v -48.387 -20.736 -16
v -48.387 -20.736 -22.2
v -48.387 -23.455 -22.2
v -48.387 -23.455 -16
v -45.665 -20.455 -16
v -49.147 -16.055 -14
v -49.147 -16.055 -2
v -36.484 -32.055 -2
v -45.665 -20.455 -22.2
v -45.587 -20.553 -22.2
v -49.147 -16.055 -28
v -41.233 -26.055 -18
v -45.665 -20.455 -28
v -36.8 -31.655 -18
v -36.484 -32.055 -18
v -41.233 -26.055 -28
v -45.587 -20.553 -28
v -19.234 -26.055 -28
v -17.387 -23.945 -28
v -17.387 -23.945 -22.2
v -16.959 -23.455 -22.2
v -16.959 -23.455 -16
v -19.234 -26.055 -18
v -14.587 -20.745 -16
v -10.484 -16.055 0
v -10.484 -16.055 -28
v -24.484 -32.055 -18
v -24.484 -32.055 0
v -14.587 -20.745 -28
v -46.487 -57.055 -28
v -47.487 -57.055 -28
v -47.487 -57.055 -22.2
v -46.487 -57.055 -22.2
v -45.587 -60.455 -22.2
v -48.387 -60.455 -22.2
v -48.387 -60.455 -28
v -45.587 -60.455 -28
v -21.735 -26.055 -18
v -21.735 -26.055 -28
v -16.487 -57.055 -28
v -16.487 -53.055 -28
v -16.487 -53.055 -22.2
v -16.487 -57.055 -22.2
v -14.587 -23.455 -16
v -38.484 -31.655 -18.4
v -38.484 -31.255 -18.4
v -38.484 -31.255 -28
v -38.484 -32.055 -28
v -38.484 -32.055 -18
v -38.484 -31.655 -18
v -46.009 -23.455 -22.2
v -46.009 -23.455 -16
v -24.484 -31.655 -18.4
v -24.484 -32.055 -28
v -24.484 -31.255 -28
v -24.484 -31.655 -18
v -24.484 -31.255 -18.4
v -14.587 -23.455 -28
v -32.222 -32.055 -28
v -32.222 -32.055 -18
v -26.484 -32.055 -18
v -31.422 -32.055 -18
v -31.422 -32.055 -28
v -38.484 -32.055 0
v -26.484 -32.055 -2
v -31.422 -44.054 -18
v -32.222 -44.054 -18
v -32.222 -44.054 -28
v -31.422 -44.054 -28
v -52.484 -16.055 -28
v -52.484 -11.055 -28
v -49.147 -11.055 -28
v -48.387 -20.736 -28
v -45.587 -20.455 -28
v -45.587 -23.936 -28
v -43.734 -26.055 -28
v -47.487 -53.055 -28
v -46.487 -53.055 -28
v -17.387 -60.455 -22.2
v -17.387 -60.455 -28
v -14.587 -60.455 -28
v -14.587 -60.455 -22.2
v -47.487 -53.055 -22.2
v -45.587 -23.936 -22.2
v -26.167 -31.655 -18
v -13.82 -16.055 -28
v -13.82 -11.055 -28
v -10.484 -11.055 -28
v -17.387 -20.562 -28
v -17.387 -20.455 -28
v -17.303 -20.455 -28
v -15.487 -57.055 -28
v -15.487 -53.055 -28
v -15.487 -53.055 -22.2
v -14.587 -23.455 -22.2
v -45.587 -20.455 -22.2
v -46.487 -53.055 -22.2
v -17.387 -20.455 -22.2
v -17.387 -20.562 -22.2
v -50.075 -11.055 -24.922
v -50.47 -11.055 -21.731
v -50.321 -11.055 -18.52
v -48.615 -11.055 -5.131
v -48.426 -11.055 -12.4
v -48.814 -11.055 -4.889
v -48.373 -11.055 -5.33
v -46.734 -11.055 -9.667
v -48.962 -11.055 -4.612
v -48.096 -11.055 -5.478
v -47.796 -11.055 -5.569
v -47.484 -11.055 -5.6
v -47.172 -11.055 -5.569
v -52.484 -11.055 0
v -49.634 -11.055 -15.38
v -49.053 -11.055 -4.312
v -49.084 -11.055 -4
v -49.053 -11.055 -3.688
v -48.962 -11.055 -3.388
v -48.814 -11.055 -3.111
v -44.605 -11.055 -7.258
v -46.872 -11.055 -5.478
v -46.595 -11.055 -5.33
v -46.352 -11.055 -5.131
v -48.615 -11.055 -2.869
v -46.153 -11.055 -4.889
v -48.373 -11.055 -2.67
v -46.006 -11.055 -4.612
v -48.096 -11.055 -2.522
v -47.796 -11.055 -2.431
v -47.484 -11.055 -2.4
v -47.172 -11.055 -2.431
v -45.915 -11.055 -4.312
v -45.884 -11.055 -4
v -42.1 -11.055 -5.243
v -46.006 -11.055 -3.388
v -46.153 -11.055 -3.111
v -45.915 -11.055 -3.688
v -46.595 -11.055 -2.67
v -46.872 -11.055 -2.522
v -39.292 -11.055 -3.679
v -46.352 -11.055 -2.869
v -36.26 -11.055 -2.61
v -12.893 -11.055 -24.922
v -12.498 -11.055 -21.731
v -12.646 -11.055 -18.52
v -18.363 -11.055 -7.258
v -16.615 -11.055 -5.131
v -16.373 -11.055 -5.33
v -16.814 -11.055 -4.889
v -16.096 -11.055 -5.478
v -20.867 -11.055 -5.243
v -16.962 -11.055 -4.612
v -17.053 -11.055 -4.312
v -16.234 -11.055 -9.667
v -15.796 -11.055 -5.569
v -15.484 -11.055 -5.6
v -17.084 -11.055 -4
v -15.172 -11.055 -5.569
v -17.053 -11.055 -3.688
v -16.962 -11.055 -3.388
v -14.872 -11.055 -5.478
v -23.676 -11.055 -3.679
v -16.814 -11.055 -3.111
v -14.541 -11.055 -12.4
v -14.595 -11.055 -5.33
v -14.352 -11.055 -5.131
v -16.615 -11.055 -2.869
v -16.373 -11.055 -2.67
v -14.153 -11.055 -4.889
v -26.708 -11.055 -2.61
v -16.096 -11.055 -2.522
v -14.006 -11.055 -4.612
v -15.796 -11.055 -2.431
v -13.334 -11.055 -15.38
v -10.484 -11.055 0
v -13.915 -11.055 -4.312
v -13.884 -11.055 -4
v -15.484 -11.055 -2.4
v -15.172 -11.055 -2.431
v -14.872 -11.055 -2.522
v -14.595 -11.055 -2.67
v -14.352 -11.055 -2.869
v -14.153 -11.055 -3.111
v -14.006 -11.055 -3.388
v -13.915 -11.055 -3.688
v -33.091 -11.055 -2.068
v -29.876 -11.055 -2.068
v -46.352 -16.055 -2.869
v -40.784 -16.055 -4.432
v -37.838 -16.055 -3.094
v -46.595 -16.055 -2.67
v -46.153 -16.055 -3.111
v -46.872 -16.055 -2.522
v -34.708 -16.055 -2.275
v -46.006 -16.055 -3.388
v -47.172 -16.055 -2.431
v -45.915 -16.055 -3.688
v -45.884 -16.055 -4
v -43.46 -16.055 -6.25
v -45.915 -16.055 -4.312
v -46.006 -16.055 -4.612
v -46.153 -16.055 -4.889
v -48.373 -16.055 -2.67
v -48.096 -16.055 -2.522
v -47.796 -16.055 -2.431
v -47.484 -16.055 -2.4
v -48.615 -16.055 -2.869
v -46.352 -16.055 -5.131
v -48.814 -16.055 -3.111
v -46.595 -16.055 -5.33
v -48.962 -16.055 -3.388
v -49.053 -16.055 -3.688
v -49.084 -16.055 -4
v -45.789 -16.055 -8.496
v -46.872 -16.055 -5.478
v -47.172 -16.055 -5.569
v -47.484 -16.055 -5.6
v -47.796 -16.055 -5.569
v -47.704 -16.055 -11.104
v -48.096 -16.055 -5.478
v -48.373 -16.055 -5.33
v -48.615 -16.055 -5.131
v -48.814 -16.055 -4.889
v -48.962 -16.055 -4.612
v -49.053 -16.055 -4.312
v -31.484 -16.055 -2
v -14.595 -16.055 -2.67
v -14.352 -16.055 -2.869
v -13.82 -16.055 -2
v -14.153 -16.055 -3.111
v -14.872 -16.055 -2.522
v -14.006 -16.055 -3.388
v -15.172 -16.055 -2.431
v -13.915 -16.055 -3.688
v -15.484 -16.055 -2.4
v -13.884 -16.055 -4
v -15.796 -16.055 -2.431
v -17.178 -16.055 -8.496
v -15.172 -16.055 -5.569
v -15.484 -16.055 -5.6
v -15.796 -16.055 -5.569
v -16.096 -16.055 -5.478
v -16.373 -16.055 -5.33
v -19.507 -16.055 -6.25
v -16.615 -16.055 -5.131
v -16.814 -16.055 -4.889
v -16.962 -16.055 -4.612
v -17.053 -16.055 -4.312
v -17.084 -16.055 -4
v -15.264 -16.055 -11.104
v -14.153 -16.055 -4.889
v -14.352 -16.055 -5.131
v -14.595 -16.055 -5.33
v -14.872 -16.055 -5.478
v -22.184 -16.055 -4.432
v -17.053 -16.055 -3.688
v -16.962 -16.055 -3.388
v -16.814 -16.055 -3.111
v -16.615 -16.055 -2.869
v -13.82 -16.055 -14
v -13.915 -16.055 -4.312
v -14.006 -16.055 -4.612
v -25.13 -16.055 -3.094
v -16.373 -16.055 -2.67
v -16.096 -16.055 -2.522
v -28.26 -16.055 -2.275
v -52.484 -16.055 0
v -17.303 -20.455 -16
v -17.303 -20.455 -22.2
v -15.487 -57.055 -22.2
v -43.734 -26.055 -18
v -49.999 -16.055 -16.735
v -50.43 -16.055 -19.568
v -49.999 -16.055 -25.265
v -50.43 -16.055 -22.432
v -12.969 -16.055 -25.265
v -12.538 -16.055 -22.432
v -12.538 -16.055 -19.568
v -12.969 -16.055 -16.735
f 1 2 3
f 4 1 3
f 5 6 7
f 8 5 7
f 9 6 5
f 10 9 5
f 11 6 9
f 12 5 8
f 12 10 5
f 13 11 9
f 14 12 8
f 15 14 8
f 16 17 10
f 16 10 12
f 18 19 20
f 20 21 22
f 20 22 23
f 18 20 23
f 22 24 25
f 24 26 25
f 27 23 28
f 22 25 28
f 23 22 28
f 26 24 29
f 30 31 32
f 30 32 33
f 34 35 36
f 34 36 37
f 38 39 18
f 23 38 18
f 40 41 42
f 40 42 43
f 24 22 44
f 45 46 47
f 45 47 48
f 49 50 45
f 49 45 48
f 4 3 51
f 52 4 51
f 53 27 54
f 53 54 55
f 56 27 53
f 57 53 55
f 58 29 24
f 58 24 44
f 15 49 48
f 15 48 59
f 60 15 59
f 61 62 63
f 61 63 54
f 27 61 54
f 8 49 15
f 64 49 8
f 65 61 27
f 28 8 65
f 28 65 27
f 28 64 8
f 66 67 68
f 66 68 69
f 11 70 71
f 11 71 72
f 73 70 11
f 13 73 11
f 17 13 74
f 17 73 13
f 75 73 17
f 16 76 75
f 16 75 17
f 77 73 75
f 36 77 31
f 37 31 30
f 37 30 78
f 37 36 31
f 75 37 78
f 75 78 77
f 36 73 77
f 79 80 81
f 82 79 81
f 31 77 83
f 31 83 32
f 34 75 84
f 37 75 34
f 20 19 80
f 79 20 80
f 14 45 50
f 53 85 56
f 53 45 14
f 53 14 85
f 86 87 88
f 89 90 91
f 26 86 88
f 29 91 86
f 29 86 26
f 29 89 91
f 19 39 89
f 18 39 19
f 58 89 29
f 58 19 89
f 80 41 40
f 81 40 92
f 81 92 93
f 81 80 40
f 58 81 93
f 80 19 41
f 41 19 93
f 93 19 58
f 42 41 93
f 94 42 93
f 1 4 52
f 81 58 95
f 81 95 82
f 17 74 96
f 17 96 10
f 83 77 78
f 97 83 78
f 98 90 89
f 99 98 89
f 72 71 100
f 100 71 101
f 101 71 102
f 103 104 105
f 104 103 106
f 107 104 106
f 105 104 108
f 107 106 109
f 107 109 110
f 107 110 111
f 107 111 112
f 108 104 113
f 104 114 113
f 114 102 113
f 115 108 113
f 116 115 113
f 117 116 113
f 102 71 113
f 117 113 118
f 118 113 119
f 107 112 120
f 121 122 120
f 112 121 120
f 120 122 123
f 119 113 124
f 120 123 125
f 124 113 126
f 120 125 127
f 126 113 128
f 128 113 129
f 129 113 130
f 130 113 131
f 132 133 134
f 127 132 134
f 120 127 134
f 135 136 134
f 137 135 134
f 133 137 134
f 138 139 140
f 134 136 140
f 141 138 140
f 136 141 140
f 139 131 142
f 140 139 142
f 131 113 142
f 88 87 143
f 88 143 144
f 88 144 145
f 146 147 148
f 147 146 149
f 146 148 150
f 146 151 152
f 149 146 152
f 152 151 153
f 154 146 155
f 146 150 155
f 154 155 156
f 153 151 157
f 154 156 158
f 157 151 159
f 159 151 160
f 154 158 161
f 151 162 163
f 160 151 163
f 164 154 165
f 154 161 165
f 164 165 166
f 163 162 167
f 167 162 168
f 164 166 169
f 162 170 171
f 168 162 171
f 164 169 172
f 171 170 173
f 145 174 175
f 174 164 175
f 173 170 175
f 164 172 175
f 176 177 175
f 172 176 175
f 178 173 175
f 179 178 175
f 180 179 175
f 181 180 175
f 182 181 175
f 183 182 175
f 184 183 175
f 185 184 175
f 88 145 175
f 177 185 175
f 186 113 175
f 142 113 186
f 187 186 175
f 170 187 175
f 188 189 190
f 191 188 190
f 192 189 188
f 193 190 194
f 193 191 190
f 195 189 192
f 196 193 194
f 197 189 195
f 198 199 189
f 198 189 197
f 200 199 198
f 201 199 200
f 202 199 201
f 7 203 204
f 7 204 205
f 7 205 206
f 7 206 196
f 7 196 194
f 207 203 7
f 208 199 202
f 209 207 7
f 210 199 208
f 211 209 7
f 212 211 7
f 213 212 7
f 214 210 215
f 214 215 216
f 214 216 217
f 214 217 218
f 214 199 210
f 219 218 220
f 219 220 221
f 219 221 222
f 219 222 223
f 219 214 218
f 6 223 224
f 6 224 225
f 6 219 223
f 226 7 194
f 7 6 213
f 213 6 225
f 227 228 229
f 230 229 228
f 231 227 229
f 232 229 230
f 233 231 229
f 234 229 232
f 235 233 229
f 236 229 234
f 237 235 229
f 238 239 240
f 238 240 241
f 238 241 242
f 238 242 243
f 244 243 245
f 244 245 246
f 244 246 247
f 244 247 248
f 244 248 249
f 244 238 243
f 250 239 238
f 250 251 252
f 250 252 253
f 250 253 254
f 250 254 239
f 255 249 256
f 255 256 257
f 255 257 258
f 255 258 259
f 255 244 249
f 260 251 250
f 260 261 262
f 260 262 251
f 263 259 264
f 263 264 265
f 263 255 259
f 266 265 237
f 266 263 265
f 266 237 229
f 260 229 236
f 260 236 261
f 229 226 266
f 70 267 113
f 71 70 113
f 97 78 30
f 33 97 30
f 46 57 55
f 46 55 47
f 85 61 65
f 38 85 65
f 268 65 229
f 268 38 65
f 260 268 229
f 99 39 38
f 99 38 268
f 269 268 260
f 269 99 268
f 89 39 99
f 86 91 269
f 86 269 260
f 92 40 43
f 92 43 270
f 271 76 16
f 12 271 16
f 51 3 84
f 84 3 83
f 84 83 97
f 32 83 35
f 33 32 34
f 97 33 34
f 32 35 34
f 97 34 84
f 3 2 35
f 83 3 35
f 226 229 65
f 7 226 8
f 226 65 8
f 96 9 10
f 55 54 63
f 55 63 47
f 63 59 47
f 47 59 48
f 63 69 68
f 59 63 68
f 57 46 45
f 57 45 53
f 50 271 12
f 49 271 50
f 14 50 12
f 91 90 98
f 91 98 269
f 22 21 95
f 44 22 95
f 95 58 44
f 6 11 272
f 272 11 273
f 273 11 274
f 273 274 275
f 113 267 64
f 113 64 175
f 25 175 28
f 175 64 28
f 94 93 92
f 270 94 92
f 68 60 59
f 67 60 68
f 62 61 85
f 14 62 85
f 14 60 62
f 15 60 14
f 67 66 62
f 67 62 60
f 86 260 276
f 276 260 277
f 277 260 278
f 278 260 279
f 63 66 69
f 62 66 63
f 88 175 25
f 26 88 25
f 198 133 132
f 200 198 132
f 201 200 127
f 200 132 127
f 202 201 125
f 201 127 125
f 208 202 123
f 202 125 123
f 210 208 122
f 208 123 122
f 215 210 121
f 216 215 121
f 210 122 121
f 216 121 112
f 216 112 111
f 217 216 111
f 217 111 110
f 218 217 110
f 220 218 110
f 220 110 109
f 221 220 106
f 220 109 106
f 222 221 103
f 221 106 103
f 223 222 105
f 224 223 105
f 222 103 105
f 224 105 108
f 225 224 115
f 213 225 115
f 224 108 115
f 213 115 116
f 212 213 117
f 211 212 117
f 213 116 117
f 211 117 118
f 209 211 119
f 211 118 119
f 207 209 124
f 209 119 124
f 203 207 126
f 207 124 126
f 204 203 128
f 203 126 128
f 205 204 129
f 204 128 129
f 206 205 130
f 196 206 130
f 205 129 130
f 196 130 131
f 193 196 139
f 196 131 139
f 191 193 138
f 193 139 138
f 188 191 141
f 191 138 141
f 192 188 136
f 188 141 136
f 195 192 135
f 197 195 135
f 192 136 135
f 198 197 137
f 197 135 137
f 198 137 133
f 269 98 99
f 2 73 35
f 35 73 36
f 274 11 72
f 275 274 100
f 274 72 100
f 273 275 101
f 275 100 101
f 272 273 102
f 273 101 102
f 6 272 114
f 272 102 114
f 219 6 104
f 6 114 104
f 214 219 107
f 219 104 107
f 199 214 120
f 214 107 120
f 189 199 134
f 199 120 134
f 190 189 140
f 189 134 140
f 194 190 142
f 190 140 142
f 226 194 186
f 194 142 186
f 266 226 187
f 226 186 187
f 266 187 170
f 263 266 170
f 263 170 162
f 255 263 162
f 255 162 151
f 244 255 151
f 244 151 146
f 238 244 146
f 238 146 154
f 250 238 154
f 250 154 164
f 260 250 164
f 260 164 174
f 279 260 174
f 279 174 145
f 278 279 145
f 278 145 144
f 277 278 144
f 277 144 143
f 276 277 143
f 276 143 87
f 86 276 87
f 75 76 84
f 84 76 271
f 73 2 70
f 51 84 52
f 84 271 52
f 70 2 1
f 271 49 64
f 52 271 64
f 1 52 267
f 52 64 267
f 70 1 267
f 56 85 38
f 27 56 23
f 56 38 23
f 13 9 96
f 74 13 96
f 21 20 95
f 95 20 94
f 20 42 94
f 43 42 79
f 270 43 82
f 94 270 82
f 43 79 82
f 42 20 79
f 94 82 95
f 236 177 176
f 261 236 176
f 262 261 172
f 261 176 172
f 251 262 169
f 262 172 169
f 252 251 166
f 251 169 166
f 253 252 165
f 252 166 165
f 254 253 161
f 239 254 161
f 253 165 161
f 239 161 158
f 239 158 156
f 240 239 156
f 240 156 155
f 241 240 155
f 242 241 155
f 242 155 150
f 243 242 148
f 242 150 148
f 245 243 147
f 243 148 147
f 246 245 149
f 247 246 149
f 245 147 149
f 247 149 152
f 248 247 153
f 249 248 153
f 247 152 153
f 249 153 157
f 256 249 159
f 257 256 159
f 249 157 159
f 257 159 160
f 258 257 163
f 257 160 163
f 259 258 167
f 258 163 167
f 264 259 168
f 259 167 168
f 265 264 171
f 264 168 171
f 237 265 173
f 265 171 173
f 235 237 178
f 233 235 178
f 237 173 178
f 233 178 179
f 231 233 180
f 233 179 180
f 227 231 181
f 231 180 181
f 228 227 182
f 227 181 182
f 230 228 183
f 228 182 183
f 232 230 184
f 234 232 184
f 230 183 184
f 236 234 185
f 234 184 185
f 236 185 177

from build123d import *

# Parameters (mm, degrees)
PAD_DEPTH       = 28
SKETCH001_R     = 19
POCKET_DEPTH    = 5
POCKET001_DEPTH = 26
SKETCH003_W     = 30
SKETCH003_H     = 6
POCKET002_DEPTH = 10
SKETCH004_W     = 2.8
SKETCH004_H     = 40
PAD001_DEPTH    = 5.8
SKETCH005_W     = 2.722469
SKETCH005_H     = 3
SKETCH005_W_2   = 2.715425
PAD002_DEPTH    = 12
SKETCH006_R     = 1.6
POCKET003_DEPTH = 5
SKETCH007_W     = 1
SKETCH007_H     = 4
POCKET004_DEPTH = 6
PAD003_DEPTH    = 10
SKETCH009_W     = 14.845783
SKETCH009_H     = 0.4
POCKET005_DEPTH = 0.4


with BuildPart() as part:
    # Sketch → Pad (new body)
    with BuildSketch(Plane(origin=(0, 0, 0), x_dir=(1, 0, 0), z_dir=(0, 0, -1))):
        Polygon((-52.483848, 11.054775), (-10.483848, 11.054775), (-10.483848, 16.054775), (-24.483848, 32.054775), (-38.483848, 32.054775), (-52.483848, 16.054775), align=None)
    extrude(amount=PAD_DEPTH)

    # Sketch001 → Pocket (cut)
    with BuildSketch(Plane(origin=(0, -11.054775, 0), x_dir=(1, 0, 0), z_dir=(0, 1, 0))):
        with Locations((-31.483848, 21)):
            Circle(SKETCH001_R)
    extrude(amount=-POCKET_DEPTH, mode=Mode.SUBTRACT)

    # Sketch002 → Pocket001 (cut)
    with BuildSketch(Plane(origin=(0, 0, -28), x_dir=(1, 0, 0), z_dir=(0, 0, -1))):
        Polygon((-49.14737, 16.054775), (-36.483848, 32.054775), (-26.483848, 32.054775), (-13.820326, 16.054775), align=None)
    extrude(amount=-POCKET001_DEPTH, mode=Mode.SUBTRACT)

    # Sketch003 → Pocket002 (cut)
    with BuildSketch(Plane(origin=(0, 0, -28), x_dir=(1, 0, 0), z_dir=(0, 0, -1))):
        with Locations((-31.483848, 29.054775)):
            Rectangle(SKETCH003_W, SKETCH003_H)
    extrude(amount=-POCKET002_DEPTH, mode=Mode.SUBTRACT)

    # Sketch004 → Pad001 (new body)
    with BuildSketch(Plane(origin=(0, 0, -28), x_dir=(1, 0, 0), z_dir=(0, 0, -1))):
        with Locations((-46.98737, 40.454775)):
            Rectangle(SKETCH004_W, SKETCH004_H)
        with Locations((-15.98737, 40.454775)):
            Rectangle(SKETCH004_W, SKETCH004_H)
    extrude(amount=-PAD001_DEPTH)

    # Sketch005 → Pad002 (new body)
    with BuildSketch(Plane(origin=(0, 0, -28), x_dir=(1, 0, 0), z_dir=(0, 0, -1))):
        with Locations((-47.026135, 21.954775)):
            Rectangle(SKETCH005_W, SKETCH005_H)
        with Locations((-15.945082, 21.954775)):
            Rectangle(SKETCH005_W_2, SKETCH005_H)
    extrude(amount=-PAD002_DEPTH)

    # Sketch006 → Pocket003 (cut)
    with BuildSketch(Plane(origin=(0, -11.054775, 0), x_dir=(1, 0, 0), z_dir=(0, 1, 0))):
        with Locations((-47.483848, 4)):
            Circle(SKETCH006_R)
        with Locations((-15.483848, 4)):
            Circle(SKETCH006_R)
    extrude(amount=-POCKET003_DEPTH, mode=Mode.SUBTRACT)

    # Sketch007 → Pocket004 (cut)
    with BuildSketch(Plane(origin=(0, 0, -28), x_dir=(1, 0, 0), z_dir=(0, 0, -1))):
        with Locations((-46.98737, 55.054775)):
            Rectangle(SKETCH007_W, SKETCH007_H)
        with Locations((-15.98737, 55.054775)):
            Rectangle(SKETCH007_W, SKETCH007_H)
    extrude(amount=-POCKET004_DEPTH, mode=Mode.SUBTRACT)

    # Sketch008 → Pad003 (new body)
    with BuildSketch(Plane(origin=(0, 0, -18), x_dir=(1, 0, 0), z_dir=(0, 0, -1))):
        Polygon((-32.222141, 44.054382), (-31.422141, 44.054382), (-31.422141, 32.054775), (-24.483848, 32.054775), (-24.483848, 31.254775), (-38.483848, 31.254775), (-38.483848, 32.054775), (-32.222141, 32.054775), align=None)
    extrude(amount=PAD003_DEPTH)

    # Sketch009 → Pocket005 (cut)
    with BuildSketch(Plane(origin=(0, -31.254775, 0), x_dir=(1, 0, 0), z_dir=(0, 1, 0))):
        with Locations((-31.447088, 18.2)):
            Rectangle(SKETCH009_W, SKETCH009_H)
    extrude(amount=-POCKET005_DEPTH, mode=Mode.SUBTRACT)


solid = part.part
